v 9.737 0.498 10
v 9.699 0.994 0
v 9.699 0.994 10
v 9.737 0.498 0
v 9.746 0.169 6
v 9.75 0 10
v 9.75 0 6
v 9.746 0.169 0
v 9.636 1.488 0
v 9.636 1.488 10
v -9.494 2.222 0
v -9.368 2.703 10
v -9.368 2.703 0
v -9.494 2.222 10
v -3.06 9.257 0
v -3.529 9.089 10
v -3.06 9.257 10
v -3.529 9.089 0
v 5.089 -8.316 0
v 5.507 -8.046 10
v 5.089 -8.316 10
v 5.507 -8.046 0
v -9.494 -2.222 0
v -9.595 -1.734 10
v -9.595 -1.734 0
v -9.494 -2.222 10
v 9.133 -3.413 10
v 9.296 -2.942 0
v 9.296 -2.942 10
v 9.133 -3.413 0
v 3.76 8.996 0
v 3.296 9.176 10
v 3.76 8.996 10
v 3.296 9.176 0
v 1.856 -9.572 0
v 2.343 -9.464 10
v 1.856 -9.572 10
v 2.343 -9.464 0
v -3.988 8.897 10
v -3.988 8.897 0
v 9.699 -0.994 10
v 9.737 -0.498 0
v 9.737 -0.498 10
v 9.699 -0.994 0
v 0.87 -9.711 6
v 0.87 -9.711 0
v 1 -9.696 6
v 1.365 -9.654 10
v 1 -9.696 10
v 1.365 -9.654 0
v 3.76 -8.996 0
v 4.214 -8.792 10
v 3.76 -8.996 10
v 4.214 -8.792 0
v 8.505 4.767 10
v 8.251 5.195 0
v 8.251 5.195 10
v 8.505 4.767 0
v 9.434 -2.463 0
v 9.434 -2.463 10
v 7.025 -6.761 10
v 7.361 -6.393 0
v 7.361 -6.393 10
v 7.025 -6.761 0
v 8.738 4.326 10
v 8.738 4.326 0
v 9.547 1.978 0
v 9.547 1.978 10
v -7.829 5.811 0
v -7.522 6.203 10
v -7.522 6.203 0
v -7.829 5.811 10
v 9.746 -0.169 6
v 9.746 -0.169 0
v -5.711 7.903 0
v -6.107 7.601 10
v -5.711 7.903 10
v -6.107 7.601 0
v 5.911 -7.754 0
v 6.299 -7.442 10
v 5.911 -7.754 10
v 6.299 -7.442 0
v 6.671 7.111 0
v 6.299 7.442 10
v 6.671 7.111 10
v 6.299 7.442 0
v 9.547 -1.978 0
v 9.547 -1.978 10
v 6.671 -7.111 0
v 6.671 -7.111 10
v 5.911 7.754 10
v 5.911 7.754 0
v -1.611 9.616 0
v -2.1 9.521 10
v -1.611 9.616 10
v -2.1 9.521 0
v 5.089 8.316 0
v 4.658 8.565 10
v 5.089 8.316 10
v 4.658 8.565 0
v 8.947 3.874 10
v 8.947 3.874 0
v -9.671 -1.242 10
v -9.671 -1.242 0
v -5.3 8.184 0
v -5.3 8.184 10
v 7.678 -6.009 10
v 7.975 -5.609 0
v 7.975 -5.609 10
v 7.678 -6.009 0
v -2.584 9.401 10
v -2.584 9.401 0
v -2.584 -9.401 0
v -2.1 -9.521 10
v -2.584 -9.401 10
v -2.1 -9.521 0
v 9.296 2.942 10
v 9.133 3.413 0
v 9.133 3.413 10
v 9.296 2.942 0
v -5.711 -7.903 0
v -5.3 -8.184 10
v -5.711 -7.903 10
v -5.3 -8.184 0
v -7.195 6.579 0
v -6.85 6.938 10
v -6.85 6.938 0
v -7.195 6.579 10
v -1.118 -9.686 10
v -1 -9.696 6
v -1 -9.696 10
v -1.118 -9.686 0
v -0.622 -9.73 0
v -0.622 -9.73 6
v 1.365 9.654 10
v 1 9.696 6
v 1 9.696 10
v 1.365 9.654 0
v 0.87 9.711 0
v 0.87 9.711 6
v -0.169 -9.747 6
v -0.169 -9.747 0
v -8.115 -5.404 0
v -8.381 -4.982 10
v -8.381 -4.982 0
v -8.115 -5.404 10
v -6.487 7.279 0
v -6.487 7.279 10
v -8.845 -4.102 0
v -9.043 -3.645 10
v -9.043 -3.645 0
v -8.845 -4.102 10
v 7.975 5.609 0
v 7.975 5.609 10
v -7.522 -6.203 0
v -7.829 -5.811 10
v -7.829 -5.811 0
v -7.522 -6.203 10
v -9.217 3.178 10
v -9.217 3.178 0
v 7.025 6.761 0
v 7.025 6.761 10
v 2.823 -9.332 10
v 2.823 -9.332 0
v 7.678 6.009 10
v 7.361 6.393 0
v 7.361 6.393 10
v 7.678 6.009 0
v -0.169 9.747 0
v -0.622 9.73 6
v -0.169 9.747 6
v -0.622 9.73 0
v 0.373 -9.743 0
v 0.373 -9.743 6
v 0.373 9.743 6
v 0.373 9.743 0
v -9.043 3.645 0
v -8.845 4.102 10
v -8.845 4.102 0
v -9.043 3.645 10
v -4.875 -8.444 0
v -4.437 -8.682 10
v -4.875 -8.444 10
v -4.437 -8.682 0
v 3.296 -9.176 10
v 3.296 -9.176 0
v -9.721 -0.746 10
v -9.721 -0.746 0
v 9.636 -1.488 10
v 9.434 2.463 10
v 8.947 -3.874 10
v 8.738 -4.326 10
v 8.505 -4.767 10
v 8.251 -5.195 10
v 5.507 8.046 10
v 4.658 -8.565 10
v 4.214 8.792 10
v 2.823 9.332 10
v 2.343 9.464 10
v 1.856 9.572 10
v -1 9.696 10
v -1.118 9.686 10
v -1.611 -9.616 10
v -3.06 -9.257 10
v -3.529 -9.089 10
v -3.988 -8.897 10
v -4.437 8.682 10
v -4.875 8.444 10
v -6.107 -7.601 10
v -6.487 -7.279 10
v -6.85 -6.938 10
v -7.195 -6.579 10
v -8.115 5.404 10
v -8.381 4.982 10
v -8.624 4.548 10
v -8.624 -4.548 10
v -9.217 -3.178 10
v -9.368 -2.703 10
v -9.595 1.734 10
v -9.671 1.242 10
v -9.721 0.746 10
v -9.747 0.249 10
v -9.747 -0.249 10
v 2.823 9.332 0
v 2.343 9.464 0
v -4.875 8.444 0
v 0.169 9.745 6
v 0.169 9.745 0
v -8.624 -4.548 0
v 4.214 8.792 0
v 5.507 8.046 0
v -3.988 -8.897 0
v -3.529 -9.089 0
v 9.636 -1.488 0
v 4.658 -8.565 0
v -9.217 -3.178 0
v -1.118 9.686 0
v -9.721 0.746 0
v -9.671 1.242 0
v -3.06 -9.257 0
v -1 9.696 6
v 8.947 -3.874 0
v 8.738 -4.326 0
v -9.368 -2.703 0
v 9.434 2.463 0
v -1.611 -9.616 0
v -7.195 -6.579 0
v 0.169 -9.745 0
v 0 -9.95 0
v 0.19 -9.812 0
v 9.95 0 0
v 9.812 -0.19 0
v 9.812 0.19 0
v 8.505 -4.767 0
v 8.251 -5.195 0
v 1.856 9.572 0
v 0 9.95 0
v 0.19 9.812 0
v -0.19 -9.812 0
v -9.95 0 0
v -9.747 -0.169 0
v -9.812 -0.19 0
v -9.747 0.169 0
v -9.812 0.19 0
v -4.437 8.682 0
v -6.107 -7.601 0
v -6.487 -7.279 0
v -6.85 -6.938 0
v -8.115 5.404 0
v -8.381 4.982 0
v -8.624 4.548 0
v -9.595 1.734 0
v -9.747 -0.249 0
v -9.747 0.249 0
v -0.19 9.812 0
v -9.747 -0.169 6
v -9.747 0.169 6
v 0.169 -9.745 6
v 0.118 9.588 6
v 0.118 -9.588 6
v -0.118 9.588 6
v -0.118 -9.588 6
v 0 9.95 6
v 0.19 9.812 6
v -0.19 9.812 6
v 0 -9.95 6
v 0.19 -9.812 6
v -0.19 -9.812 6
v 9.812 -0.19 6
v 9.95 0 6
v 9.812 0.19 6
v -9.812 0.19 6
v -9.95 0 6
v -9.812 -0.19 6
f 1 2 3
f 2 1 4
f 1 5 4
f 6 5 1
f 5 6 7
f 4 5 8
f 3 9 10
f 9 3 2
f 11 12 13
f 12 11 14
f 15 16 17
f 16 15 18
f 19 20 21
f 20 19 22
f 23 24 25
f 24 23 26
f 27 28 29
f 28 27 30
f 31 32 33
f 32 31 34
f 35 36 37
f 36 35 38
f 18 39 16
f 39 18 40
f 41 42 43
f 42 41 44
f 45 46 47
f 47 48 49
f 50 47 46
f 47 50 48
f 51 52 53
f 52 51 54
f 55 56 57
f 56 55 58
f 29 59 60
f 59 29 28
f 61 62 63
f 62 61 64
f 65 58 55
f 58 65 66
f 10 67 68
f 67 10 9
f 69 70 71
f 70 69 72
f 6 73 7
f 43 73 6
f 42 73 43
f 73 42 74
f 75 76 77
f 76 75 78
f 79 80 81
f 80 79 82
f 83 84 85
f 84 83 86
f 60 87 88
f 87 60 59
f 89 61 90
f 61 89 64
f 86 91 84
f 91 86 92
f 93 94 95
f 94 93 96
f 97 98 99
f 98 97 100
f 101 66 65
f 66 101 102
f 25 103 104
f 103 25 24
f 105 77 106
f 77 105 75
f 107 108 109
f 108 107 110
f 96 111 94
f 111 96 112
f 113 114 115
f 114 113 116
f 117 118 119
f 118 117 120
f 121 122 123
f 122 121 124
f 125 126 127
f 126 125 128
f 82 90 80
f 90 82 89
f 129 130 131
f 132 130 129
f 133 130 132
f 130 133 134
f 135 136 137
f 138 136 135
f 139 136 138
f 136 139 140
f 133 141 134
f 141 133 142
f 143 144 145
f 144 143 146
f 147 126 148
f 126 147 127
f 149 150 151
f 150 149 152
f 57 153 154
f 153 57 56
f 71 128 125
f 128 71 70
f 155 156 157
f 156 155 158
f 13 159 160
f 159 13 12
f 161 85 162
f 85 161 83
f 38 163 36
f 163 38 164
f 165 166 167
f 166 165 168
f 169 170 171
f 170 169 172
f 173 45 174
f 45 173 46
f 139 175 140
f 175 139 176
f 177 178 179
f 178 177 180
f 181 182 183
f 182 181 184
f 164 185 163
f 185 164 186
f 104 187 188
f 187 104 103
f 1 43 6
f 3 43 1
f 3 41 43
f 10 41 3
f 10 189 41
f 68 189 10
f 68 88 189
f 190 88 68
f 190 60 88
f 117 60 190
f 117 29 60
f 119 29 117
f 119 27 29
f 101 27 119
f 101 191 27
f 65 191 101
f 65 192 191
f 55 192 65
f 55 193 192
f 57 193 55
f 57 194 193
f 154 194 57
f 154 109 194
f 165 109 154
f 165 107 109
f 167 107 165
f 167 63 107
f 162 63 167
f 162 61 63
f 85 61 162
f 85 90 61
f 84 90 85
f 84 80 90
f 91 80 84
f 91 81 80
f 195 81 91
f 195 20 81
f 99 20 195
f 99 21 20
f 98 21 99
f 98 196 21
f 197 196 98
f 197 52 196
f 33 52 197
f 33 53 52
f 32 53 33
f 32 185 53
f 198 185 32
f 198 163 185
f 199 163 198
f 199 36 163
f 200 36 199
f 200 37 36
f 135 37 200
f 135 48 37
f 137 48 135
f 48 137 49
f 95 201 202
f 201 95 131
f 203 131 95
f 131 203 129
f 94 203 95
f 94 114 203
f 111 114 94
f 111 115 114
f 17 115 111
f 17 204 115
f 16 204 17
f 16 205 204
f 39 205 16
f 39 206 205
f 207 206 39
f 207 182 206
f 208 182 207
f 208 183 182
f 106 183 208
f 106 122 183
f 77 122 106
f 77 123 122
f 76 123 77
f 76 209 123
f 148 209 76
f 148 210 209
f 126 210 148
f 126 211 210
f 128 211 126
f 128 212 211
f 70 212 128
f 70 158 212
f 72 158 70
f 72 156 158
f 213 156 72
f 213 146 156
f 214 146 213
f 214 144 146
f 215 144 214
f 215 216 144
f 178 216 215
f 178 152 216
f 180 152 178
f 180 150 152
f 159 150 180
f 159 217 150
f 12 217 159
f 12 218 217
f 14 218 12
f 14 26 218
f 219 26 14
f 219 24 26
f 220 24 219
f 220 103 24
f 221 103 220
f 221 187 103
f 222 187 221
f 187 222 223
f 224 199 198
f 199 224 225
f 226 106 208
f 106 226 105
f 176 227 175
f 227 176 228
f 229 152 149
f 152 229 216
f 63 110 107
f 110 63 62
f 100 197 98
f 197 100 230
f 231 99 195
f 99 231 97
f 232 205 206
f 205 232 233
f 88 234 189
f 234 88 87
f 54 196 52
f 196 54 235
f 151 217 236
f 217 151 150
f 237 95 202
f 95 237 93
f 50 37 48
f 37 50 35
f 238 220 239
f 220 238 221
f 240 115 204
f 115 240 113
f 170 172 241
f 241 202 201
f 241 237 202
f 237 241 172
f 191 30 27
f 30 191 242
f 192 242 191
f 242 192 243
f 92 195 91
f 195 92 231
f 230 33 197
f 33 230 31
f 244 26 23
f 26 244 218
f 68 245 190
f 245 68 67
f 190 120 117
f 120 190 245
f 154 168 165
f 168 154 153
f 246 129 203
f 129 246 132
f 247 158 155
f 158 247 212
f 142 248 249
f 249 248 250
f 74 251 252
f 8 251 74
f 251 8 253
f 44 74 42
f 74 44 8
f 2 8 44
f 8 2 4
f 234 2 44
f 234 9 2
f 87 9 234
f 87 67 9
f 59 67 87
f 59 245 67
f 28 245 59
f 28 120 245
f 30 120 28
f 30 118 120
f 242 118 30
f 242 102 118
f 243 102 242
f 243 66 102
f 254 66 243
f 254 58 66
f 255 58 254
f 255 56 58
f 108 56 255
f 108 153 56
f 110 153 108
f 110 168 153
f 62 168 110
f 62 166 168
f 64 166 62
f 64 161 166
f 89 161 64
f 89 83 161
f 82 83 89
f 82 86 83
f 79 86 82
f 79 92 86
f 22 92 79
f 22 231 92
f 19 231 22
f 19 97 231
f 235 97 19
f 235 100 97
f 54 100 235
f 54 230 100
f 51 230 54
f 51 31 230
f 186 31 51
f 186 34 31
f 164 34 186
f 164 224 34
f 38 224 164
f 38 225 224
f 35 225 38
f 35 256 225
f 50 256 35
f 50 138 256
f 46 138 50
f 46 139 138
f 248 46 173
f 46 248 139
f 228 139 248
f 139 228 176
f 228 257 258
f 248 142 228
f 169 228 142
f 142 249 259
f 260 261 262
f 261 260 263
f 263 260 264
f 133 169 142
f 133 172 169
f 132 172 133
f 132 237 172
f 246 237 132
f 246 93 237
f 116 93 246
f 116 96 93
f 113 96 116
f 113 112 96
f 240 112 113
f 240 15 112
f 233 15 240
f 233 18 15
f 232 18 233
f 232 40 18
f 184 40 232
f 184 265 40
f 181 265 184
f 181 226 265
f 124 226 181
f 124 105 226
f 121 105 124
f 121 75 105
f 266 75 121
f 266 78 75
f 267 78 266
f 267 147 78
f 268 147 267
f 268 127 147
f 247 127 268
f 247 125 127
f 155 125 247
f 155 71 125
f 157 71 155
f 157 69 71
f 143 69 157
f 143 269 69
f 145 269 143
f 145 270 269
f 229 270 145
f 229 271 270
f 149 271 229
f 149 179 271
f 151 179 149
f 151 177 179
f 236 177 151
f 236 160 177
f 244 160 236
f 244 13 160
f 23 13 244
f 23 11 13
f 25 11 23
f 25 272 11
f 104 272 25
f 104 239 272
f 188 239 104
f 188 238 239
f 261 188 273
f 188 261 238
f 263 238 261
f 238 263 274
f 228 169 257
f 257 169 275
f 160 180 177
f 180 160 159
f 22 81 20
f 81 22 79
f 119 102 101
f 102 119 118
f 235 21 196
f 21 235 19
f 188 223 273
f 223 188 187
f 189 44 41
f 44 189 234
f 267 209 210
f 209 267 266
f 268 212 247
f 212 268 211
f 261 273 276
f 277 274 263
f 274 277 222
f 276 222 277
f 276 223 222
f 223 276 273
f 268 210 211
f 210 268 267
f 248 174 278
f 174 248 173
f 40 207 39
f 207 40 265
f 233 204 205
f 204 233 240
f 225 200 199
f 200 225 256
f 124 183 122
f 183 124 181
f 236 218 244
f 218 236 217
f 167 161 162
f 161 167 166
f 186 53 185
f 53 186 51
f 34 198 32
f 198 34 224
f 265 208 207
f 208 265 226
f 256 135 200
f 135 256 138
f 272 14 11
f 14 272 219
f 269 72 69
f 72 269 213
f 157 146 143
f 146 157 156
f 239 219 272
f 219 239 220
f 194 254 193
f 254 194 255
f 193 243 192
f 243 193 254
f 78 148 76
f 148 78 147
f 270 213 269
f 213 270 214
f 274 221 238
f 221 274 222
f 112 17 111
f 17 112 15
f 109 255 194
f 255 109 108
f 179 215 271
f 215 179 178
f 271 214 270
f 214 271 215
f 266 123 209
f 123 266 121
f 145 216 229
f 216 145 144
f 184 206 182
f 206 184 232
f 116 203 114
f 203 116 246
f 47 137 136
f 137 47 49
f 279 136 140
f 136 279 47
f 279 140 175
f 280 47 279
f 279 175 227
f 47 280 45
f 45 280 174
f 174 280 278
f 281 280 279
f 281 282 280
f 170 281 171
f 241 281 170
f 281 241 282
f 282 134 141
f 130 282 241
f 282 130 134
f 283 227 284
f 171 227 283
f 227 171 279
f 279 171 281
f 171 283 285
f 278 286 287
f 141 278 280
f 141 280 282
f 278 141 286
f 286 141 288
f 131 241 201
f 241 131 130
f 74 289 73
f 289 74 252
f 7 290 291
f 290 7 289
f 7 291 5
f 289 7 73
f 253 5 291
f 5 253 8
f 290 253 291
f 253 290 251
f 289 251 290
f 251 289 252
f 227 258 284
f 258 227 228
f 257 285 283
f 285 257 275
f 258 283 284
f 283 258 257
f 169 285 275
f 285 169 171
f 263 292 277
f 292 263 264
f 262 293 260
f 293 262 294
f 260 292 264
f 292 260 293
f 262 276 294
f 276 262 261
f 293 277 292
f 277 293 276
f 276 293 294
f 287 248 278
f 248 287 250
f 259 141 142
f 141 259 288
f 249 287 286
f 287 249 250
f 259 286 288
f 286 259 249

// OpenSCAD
$fa=1;
$fs=.5;
plug_height=10;
plug_r=10;
plug_rtol=0.25;
slot_depth=4;
slot_width=2;
ridge_r=0.2;

module thread_ridge() //vertical ridge to catch threads in brush hole
{
	#cylinder(h=plug_height-slot_depth, r=ridge_r);
}

union()
{
	difference() //plug with .25mm tolerance and slot for turning
	{
		cylinder(h=plug_height, r=plug_r-plug_rtol);
		translate([-slot_width/2,-plug_r-0.75,plug_height-4])
			#cube([slot_width,2*plug_r+1.5,slot_depth+1]);
	}
	
	for(r=[0:90:359]) //create 4 thread ridges around the circumference of the plug
		{
		rotate([0,0,r])
			translate([plug_r-plug_rtol,0,0])
				thread_ridge();
		}
}
